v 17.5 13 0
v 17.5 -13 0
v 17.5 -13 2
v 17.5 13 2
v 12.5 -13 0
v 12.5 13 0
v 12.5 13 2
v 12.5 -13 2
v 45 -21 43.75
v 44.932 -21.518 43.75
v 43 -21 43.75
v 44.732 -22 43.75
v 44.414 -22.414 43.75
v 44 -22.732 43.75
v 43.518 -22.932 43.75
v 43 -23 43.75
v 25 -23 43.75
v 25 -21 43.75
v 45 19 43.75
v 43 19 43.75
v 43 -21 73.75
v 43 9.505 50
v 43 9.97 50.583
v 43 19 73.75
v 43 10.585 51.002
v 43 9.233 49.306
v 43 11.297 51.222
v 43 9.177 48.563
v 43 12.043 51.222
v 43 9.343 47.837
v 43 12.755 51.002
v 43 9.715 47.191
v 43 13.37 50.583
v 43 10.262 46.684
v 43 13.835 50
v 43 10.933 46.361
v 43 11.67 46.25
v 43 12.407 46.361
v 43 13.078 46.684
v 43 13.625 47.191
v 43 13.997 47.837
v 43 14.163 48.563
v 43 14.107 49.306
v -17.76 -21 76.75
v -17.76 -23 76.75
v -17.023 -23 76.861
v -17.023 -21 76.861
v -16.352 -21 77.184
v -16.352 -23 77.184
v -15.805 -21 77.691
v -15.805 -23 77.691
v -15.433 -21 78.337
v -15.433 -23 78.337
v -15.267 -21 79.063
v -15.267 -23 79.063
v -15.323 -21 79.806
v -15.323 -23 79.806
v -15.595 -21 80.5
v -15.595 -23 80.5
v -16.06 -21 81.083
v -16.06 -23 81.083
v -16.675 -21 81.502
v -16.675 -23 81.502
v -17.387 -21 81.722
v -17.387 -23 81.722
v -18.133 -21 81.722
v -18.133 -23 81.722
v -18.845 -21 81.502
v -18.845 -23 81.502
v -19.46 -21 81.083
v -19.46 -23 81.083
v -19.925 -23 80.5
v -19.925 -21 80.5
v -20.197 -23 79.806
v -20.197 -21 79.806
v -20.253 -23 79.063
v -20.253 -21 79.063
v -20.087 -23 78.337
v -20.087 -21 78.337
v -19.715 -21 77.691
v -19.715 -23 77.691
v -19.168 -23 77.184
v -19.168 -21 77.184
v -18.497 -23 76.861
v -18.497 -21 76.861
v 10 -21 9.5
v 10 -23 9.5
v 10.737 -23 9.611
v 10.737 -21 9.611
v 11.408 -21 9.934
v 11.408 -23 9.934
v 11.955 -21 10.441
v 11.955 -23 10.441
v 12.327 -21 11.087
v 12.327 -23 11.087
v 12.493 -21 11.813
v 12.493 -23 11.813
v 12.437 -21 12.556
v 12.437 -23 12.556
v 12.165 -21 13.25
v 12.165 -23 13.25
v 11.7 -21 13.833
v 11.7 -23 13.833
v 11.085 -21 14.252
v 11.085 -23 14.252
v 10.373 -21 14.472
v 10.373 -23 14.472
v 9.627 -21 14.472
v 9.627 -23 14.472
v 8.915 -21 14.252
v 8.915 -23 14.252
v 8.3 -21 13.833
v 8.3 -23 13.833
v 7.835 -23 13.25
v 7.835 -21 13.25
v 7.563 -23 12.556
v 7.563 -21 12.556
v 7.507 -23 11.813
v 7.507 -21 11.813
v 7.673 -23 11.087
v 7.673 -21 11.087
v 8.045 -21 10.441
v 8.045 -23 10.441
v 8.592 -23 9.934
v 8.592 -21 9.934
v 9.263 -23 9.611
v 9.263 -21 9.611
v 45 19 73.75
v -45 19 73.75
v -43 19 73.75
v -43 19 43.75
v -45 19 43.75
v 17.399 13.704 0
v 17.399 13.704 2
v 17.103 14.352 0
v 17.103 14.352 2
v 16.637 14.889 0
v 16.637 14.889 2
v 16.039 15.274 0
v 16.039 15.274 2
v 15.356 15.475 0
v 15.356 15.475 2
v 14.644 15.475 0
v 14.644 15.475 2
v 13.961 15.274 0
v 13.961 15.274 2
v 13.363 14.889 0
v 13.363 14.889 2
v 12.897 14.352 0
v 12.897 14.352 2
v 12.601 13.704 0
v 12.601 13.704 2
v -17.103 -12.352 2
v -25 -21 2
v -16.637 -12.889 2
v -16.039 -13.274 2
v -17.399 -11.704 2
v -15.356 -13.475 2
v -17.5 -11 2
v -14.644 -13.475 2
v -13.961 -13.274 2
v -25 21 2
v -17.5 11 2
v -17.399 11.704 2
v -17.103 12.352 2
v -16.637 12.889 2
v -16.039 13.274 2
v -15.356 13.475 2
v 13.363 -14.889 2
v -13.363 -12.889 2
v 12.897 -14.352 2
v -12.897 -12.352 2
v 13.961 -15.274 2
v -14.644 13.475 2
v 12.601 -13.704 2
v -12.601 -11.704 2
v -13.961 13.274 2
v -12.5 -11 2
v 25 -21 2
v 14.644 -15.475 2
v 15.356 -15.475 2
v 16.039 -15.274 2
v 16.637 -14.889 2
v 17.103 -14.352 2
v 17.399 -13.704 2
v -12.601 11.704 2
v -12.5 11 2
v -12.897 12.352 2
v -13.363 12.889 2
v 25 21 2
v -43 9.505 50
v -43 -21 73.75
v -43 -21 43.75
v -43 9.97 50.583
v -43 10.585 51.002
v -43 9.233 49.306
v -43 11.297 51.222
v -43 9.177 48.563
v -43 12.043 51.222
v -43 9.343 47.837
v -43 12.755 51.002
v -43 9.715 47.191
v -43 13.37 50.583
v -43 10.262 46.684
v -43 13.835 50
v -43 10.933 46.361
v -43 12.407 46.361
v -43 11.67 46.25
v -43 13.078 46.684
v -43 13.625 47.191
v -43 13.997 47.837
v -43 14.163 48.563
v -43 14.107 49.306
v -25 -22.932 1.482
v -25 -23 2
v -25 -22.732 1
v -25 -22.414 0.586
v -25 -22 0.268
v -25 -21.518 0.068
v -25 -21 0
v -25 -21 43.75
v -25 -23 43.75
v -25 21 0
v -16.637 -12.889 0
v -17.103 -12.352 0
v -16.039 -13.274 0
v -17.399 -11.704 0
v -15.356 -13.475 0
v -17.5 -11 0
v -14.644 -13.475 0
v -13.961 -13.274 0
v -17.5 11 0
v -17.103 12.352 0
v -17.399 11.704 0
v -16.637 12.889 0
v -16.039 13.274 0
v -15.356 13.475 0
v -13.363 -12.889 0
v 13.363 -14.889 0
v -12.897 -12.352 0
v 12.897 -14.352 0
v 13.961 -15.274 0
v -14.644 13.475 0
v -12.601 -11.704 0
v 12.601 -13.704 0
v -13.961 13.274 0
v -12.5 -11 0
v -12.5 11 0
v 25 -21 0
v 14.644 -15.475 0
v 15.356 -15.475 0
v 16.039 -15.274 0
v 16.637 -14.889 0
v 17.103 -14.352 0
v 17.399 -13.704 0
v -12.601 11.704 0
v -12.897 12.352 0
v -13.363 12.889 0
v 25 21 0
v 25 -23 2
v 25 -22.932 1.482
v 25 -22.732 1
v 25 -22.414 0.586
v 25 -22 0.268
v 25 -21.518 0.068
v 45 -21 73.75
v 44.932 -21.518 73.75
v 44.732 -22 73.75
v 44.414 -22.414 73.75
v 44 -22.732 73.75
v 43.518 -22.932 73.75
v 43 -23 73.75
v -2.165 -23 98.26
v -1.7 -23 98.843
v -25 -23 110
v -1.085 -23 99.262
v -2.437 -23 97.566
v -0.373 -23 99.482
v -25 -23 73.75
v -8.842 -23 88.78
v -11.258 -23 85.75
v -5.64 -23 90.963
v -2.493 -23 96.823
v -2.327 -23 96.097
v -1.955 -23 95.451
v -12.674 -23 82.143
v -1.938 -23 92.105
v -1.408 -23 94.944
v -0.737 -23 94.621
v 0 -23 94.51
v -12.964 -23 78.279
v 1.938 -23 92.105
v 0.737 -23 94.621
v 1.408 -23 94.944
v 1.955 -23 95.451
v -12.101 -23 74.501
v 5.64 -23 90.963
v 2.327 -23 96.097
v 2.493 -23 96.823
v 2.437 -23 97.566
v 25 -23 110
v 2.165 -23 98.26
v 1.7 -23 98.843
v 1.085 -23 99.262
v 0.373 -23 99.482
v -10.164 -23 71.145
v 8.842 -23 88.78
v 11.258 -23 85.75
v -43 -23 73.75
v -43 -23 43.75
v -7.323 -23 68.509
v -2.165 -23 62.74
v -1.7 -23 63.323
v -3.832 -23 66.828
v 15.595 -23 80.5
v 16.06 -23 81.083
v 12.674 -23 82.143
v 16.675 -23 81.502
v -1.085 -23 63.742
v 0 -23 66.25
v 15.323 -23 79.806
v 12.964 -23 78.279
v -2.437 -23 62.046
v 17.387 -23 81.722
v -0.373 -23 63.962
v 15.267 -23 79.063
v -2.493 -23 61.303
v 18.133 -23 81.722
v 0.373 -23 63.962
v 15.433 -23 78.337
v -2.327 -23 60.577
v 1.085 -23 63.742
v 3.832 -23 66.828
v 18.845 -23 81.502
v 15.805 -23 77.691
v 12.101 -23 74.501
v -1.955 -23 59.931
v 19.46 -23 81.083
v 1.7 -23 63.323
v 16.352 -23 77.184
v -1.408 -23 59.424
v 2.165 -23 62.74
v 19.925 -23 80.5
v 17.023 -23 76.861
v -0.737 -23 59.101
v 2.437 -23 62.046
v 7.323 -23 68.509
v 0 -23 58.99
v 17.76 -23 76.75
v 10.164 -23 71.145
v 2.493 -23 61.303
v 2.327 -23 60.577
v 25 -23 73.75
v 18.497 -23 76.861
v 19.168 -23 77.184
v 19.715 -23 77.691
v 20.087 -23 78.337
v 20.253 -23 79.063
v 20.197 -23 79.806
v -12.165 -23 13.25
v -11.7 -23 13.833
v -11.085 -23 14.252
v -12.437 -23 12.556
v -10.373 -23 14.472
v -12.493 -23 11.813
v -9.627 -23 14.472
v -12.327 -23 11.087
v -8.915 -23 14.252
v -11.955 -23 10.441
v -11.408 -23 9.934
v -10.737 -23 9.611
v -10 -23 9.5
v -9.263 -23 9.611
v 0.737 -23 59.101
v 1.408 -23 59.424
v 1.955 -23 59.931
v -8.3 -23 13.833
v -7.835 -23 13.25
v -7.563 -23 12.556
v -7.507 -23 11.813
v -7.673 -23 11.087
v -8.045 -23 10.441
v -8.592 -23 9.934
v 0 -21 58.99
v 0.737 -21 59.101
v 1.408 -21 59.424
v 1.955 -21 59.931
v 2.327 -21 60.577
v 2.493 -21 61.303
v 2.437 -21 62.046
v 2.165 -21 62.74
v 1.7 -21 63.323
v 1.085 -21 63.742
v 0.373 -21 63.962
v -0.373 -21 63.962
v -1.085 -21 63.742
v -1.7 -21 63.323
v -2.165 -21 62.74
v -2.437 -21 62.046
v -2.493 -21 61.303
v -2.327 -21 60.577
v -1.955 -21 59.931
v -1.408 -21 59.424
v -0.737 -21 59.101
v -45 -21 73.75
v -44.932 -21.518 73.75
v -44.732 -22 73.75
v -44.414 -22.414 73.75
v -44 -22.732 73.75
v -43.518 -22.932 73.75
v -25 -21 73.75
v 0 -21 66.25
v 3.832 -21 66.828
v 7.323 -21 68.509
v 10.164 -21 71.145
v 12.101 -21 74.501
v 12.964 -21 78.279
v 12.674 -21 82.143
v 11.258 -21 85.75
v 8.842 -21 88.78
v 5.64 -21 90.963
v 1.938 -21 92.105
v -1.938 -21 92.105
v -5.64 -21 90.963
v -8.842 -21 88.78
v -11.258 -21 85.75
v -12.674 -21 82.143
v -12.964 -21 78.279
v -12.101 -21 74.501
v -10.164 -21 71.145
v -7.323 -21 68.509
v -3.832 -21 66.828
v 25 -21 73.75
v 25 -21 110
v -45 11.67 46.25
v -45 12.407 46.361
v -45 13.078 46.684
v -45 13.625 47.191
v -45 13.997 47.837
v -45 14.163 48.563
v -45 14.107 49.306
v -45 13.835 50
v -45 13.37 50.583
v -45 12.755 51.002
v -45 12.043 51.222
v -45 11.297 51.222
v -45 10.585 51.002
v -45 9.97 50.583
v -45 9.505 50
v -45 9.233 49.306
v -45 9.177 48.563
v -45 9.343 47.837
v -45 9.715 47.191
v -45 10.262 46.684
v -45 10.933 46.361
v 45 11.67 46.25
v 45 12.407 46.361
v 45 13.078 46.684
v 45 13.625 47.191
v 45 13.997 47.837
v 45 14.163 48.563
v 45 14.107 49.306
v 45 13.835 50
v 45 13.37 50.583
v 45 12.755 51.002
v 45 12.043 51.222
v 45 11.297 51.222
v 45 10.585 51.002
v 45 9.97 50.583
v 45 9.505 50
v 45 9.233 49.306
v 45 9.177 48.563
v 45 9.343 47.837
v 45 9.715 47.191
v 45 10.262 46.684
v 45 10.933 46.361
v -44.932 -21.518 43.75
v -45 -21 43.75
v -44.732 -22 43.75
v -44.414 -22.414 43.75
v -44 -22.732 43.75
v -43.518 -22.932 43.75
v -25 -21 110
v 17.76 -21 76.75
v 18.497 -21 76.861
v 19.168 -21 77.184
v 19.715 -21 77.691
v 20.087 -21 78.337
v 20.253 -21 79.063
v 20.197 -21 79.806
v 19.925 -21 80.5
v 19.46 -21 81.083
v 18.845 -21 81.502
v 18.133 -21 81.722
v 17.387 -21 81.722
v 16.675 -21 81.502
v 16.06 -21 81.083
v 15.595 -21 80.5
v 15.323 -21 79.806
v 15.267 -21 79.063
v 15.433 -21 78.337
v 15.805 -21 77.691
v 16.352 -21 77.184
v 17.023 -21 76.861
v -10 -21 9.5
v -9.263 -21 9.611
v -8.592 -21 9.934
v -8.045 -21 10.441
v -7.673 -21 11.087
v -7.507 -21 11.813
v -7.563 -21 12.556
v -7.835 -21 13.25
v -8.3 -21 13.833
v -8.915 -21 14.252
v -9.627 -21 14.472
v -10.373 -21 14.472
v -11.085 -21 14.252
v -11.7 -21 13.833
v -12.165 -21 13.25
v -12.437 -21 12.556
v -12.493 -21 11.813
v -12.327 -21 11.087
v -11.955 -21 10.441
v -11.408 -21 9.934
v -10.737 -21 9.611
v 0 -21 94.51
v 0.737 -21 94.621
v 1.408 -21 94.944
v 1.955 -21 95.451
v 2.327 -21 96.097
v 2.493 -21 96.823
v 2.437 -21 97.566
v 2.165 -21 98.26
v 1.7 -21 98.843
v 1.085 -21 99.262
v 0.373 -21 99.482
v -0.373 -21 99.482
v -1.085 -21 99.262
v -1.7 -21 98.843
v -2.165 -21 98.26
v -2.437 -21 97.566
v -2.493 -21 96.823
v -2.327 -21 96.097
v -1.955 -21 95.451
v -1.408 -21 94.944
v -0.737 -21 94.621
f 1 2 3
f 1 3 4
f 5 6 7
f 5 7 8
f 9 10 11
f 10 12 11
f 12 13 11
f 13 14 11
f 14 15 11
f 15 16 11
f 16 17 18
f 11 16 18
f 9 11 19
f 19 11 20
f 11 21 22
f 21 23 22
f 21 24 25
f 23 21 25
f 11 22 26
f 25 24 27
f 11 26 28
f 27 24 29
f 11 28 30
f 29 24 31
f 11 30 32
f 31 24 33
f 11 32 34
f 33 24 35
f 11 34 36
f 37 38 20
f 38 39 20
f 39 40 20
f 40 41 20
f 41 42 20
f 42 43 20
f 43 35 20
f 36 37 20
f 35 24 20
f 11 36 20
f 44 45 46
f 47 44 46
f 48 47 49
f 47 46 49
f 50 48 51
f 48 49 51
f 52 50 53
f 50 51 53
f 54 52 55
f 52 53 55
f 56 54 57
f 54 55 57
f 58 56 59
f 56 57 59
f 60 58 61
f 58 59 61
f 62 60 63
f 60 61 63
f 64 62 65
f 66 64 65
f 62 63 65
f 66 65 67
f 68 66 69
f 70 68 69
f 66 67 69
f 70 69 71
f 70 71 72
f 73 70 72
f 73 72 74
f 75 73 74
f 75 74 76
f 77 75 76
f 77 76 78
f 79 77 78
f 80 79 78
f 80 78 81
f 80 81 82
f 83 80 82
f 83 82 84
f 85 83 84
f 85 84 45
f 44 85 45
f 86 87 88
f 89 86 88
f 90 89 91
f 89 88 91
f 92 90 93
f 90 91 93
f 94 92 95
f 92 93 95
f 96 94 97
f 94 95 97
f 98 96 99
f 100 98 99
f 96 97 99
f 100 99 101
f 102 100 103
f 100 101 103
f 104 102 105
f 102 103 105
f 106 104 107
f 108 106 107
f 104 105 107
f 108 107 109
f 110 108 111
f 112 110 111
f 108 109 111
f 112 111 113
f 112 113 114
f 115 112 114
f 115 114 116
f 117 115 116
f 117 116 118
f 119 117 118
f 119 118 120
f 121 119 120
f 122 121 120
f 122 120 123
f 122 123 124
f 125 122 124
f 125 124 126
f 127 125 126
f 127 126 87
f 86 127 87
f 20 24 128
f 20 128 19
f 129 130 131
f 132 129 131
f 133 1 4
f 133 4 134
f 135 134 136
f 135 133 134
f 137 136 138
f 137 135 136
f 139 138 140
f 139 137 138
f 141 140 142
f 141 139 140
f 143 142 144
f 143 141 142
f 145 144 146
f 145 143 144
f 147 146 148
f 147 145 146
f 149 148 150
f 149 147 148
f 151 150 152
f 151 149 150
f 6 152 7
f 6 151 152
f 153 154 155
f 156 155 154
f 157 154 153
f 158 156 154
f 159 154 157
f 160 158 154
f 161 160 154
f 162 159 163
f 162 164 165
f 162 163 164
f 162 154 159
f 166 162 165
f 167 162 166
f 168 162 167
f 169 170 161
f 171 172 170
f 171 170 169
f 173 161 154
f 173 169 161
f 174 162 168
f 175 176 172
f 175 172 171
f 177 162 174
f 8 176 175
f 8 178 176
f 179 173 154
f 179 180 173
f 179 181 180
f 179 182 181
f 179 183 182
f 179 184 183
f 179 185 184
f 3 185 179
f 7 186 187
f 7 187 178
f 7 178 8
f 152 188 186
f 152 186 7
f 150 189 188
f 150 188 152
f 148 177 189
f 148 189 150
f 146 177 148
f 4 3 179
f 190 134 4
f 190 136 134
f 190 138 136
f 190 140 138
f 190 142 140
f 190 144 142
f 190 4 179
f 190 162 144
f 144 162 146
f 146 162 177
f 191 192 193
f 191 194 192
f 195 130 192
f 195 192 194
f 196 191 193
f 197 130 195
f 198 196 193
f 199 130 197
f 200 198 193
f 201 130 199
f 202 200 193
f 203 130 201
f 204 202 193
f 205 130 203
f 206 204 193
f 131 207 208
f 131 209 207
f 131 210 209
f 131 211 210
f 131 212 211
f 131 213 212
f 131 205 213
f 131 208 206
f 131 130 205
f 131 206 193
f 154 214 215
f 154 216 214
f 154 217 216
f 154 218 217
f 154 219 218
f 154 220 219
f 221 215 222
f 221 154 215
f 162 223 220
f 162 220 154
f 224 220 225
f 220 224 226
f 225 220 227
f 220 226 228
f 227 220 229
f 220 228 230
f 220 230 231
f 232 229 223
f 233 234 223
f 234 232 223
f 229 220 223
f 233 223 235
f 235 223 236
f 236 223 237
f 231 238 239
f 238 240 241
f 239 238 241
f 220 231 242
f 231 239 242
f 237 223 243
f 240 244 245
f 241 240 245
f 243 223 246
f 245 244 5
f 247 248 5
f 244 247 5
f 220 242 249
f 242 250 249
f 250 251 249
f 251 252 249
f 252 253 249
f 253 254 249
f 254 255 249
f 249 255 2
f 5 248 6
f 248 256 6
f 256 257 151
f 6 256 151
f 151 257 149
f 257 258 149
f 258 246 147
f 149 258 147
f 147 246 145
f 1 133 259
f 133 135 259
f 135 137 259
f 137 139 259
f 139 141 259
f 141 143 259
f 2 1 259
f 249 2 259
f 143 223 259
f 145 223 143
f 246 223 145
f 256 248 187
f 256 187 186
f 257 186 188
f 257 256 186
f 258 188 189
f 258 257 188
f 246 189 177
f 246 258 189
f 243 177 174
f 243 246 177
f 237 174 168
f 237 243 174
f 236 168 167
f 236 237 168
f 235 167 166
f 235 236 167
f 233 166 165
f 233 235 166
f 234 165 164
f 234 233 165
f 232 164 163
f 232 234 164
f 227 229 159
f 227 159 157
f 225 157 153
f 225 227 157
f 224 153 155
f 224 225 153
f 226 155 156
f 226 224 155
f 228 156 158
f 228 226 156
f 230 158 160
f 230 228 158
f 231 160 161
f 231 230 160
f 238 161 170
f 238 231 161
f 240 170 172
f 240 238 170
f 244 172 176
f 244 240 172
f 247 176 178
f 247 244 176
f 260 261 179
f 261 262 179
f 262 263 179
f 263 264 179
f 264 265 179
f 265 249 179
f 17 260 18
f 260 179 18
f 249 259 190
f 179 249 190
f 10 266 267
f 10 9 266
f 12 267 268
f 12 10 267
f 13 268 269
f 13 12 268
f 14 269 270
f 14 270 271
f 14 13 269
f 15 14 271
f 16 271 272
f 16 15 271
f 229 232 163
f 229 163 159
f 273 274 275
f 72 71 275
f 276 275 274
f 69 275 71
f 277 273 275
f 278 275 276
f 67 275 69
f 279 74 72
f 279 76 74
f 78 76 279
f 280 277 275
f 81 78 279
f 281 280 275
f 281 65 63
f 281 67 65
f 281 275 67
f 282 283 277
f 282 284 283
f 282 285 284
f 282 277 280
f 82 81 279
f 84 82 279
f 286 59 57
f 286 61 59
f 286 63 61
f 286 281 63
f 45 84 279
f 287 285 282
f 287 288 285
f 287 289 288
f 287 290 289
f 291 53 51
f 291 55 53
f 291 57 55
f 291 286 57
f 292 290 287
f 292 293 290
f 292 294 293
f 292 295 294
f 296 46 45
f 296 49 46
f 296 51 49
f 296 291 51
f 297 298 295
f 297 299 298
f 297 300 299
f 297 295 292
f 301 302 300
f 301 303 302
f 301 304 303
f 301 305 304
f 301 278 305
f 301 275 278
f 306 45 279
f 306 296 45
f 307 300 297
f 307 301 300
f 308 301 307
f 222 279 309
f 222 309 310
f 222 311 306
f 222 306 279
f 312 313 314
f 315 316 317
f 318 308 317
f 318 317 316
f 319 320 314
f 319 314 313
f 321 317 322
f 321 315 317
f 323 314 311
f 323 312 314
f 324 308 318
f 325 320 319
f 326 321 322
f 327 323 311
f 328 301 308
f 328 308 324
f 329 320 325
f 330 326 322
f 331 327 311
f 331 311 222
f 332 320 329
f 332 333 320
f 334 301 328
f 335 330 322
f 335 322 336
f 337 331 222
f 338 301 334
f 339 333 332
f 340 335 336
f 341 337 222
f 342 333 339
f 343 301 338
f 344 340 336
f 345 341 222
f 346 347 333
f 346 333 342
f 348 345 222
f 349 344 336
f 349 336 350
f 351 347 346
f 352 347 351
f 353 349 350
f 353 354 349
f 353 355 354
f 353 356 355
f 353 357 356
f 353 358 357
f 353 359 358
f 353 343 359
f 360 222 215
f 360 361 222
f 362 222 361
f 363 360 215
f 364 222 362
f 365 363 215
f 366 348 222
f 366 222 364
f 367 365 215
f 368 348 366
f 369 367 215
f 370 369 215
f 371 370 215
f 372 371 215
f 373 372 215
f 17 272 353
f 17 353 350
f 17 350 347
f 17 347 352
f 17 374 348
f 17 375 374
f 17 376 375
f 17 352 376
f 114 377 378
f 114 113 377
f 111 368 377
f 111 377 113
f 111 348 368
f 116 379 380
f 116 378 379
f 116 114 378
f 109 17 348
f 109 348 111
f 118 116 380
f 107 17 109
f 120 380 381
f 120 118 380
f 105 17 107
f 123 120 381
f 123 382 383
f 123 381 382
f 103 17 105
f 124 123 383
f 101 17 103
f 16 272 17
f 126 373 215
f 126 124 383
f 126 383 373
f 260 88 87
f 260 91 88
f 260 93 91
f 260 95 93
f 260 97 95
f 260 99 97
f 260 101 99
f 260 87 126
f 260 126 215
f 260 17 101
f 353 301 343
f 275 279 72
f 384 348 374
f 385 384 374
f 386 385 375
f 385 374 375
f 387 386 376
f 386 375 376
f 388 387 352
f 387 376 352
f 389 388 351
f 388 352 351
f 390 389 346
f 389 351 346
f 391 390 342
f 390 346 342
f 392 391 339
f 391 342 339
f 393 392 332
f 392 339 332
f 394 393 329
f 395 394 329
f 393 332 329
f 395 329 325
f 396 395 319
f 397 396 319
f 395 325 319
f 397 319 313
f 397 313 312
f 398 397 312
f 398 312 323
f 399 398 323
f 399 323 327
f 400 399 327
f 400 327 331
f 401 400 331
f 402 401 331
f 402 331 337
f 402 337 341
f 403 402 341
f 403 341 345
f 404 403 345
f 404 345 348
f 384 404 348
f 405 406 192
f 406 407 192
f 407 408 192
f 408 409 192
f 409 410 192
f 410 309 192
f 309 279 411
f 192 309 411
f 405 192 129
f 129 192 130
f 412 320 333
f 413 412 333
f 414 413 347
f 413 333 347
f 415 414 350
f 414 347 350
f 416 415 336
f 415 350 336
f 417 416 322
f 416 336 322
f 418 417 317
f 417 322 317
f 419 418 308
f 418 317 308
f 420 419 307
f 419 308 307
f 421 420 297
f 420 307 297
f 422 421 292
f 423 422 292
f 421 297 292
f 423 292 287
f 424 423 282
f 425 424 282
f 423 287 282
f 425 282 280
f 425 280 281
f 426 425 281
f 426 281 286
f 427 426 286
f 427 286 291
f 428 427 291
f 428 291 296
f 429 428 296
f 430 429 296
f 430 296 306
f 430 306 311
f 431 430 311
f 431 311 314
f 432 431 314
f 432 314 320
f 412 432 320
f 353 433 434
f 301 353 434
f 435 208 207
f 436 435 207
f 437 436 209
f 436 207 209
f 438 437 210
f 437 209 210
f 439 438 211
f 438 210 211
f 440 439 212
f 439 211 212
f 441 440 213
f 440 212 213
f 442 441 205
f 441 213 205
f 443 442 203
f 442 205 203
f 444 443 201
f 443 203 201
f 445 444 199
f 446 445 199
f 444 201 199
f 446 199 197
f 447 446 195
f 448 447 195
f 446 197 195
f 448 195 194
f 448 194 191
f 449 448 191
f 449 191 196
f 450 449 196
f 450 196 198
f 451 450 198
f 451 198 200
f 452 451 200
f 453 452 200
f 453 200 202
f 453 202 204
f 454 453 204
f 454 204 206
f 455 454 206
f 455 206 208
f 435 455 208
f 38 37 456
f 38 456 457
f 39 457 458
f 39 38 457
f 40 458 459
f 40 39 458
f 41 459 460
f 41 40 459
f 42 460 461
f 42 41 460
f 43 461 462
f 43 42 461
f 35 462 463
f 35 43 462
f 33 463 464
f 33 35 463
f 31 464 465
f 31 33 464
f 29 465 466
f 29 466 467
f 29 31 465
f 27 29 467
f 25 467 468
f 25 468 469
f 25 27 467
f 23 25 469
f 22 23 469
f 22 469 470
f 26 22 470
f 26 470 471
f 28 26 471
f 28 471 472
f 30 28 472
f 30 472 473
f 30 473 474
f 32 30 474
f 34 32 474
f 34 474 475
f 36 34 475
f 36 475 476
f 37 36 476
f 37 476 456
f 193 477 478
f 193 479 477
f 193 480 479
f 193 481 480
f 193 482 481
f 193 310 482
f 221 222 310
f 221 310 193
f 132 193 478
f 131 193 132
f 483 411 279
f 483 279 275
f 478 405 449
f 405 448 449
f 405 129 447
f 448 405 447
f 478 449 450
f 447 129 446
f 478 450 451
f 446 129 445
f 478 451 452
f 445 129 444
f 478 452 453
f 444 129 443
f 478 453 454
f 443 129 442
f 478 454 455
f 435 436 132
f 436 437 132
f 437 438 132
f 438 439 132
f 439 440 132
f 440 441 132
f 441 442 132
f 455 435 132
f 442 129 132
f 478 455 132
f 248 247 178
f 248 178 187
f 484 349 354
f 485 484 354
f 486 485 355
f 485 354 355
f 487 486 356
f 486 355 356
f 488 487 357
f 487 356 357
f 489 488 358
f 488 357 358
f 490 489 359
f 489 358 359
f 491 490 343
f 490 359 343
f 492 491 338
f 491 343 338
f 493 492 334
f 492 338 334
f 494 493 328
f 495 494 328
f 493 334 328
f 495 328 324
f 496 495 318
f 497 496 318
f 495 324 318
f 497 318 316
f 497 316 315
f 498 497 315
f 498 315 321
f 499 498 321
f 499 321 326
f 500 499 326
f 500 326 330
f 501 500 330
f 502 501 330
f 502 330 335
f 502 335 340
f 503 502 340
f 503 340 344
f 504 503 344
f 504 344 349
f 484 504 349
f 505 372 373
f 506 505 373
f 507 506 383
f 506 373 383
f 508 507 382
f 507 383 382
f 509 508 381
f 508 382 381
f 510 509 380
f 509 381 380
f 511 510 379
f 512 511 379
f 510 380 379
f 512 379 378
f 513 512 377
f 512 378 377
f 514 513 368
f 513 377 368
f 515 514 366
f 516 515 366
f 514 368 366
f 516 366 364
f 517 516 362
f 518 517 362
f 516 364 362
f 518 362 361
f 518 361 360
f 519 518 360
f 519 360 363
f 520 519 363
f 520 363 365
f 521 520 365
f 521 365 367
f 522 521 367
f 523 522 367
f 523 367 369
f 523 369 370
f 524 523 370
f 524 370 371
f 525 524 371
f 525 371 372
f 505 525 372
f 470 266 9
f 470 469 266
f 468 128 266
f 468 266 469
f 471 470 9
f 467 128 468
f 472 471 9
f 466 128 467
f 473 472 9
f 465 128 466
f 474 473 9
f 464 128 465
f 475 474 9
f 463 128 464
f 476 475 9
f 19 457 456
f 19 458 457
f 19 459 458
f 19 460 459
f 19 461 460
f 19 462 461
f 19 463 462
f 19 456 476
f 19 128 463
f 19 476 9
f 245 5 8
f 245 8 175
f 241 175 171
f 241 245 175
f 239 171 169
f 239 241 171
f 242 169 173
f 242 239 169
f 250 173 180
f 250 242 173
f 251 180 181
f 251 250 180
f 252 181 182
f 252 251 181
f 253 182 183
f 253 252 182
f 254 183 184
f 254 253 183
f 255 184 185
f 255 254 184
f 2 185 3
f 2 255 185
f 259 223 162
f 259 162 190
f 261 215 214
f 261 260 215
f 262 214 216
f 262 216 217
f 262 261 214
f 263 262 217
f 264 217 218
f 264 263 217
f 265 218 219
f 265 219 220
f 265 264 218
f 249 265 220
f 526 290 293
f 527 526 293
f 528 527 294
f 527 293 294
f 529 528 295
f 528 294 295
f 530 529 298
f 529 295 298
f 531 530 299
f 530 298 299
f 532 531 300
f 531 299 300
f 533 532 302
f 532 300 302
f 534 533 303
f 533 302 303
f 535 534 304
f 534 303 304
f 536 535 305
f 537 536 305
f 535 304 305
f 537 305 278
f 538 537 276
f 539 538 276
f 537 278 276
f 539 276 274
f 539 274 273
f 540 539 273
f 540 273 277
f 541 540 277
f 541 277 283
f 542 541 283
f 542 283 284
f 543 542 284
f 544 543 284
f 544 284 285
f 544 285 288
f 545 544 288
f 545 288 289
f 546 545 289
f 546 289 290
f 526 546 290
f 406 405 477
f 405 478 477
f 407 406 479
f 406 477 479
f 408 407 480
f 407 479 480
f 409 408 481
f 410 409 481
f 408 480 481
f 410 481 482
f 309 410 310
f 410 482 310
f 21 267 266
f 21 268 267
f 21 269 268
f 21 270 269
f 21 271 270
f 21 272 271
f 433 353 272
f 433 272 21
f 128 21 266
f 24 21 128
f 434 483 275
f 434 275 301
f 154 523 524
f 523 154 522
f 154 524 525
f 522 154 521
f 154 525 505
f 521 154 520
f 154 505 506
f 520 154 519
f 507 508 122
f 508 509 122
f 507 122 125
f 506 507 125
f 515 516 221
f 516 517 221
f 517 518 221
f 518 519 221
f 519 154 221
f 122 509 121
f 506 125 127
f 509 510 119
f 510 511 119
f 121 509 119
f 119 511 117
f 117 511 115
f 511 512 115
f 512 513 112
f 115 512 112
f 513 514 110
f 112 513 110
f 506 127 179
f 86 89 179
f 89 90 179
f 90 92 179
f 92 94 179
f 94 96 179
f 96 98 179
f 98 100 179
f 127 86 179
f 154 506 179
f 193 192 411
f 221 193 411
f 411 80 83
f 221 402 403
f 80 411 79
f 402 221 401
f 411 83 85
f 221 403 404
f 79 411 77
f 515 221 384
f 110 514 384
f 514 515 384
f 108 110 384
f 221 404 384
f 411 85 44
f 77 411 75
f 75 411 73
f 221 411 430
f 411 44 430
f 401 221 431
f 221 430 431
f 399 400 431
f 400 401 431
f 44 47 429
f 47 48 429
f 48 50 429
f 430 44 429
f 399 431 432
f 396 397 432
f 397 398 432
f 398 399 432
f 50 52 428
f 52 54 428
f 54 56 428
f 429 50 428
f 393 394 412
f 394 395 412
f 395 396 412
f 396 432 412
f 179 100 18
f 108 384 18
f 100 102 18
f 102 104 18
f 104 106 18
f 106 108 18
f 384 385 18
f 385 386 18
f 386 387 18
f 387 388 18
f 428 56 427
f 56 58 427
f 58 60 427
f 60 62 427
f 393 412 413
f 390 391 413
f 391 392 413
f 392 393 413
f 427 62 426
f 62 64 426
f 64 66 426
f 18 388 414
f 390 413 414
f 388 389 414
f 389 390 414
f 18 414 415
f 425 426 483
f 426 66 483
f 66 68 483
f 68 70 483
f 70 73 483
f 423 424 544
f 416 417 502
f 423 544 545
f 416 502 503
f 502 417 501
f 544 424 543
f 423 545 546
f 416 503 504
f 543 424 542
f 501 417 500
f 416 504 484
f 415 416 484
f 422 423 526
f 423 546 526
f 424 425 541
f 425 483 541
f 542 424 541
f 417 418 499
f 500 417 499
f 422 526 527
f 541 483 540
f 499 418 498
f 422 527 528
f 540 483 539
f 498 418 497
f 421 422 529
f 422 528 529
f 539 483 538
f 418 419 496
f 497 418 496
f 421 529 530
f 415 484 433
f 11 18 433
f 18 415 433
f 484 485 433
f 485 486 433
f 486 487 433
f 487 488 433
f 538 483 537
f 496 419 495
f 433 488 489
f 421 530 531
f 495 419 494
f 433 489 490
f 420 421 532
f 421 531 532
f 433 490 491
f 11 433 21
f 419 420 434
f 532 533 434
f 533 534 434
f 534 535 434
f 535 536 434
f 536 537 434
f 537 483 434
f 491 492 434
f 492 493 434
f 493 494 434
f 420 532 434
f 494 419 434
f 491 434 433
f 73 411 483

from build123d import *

# Parameters (mm, degrees)
SKETCH_1_W          = 50
SKETCH_1_H          = 42
EXTRUDE_1_DEPTH     = 2
SKETCH_2_W          = 50
SKETCH_2_H          = 110
EXTRUDE_2_DEPTH     = 2
CUT_EXTRUDE_1_REACH = 123.083
SKETCH_3_R          = 2.5
CUT_EXTRUDE_2_REACH = 123.083
SKETCH_4_R          = 13
FILLET_1_R          = 2
SKETCH_5_W          = 30
SKETCH_5_H          = 2
EXTRUDE_3_DEPTH     = 18
SKETCH_6_W          = 30
SKETCH_6_H          = 42
EXTRUDE_4_DEPTH     = 2
FILLET_2_R          = 2
CUT_EXTRUDE_3_REACH = 144.734
SKETCH_7_R          = 2.5
CUT_EXTRUDE_4_REACH = 128.732
SKETCH_8_R          = 2.5


with BuildPart() as part:
    # 草图1 → 凸台-拉伸1 (new body)
    with BuildSketch(Plane.XY):
        Rectangle(SKETCH_1_W, SKETCH_1_H)
        with BuildLine():
            Line((-17.5, 11), (-17.5, -11))
            ThreePointArc((-17.5, -11), (-15, -13.5), (-12.5, -11))
            Line((-12.5, -11), (-12.5, 11))
            ThreePointArc((-12.5, 11), (-15, 13.5), (-17.5, 11))
        make_face(mode=Mode.SUBTRACT)
        with BuildLine():
            Line((12.5, 13), (12.5, -13))
            ThreePointArc((12.5, -13), (15, -15.5), (17.5, -13))
            Line((17.5, -13), (17.5, 13))
            ThreePointArc((17.5, 13), (15, 15.5), (12.5, 13))
        make_face(mode=Mode.SUBTRACT)
    extrude(amount=EXTRUDE_1_DEPTH)

    # 草图2 → 凸台-拉伸2 (add)
    with BuildSketch(Plane.XZ.offset(21)):
        with Locations((0, 55)):
            Rectangle(SKETCH_2_W, SKETCH_2_H)
    extrude(amount=EXTRUDE_2_DEPTH)

    # 草图3 → 切除-拉伸1 (cut, up to next)
    with BuildSketch(Plane.XZ.offset(23), mode=Mode.PRIVATE) as cut_extrude_1_sk1:
        with Locations((17.76, 79.25)):
            Circle(SKETCH_3_R)
    cut_extrude_1_tool1 = extrude(cut_extrude_1_sk1.sketch, amount=-CUT_EXTRUDE_1_REACH, mode=Mode.PRIVATE) & part.part
    # 草图3 → 切除-拉伸1 (cut, up to next)
    with BuildSketch(Plane.XZ.offset(23), mode=Mode.PRIVATE) as cut_extrude_1_sk2:
        with Locations((-17.76, 79.25)):
            Circle(SKETCH_3_R)
    cut_extrude_1_tool2 = extrude(cut_extrude_1_sk2.sketch, amount=-CUT_EXTRUDE_1_REACH, mode=Mode.PRIVATE) & part.part
    # 草图3 → 切除-拉伸1 (cut, up to next)
    with BuildSketch(Plane.XZ.offset(23), mode=Mode.PRIVATE) as cut_extrude_1_sk3:
        with Locations((0, 61.49)):
            Circle(SKETCH_3_R)
    cut_extrude_1_tool3 = extrude(cut_extrude_1_sk3.sketch, amount=-CUT_EXTRUDE_1_REACH, mode=Mode.PRIVATE) & part.part
    # 草图3 → 切除-拉伸1 (cut, up to next)
    with BuildSketch(Plane.XZ.offset(23), mode=Mode.PRIVATE) as cut_extrude_1_sk4:
        with Locations((0, 97.01)):
            Circle(SKETCH_3_R)
    cut_extrude_1_tool4 = extrude(cut_extrude_1_sk4.sketch, amount=-CUT_EXTRUDE_1_REACH, mode=Mode.PRIVATE) & part.part
    add(cut_extrude_1_tool1.solids().sort_by_distance((17.76, -23, 79.25))[0], mode=Mode.SUBTRACT)
    add(cut_extrude_1_tool2.solids().sort_by_distance((-17.76, -23, 79.25))[0], mode=Mode.SUBTRACT)
    add(cut_extrude_1_tool3.solids().sort_by_distance((0, -23, 61.49))[0], mode=Mode.SUBTRACT)
    add(cut_extrude_1_tool4.solids().sort_by_distance((0, -23, 97.01))[0], mode=Mode.SUBTRACT)

    # 草图4 → 切除-拉伸2 (cut, up to next)
    with BuildSketch(Plane.XZ.offset(23), mode=Mode.PRIVATE) as cut_extrude_2_sk1:
        with Locations((0, 79.25)):
            Circle(SKETCH_4_R)
    cut_extrude_2_tool1 = extrude(cut_extrude_2_sk1.sketch, amount=-CUT_EXTRUDE_2_REACH, mode=Mode.PRIVATE) & part.part
    add(cut_extrude_2_tool1.solids().sort_by_distance((0, -23, 79.25))[0], mode=Mode.SUBTRACT)

    # 圆角1
    fillet_1_edges = [part.edges().sort_by_distance(p)[0] for p in [
        (0, -23, 0),
    ]]
    fillet(fillet_1_edges, radius=FILLET_1_R)

    # 草图5 → 凸台-拉伸3 (add)
    with BuildSketch(Plane(origin=(25, 0, 0), x_dir=(0, 0, -1), z_dir=(1, 0, 0))):
        with Locations((-58.75, -22)):
            Rectangle(SKETCH_5_W, SKETCH_5_H)
    extrude_3 = extrude(amount=EXTRUDE_3_DEPTH)

    # 草图6 → 凸台-拉伸4 (add)
    with BuildSketch(Plane(origin=(43, 0, 0), x_dir=(0, 0, -1), z_dir=(1, 0, 0))):
        with Locations((-58.75, -2)):
            Rectangle(SKETCH_6_W, SKETCH_6_H)
    extrude_4 = extrude(amount=EXTRUDE_4_DEPTH)

    # 镜向1: 凸台-拉伸3, 凸台-拉伸4 across plane
    add(extrude_3.mirror(Plane(origin=(0, 0, 0), x_dir=(0, 0, 1), z_dir=(1, 0, 0))))
    add(extrude_4.mirror(Plane(origin=(0, 0, 0), x_dir=(0, 0, 1), z_dir=(1, 0, 0))))

    # 圆角2
    fillet_2_edges = [part.edges().sort_by_distance(p)[0] for p in [
        (-45, -23, 58.75),
        (45, -23, 58.75),
    ]]
    fillet(fillet_2_edges, radius=FILLET_2_R)

    # 草图7 → 切除-拉伸3 (cut, up to next)
    with BuildSketch(Plane(origin=(-43, 0, 0), x_dir=(0, 0, -1), z_dir=(1, 0, 0)), mode=Mode.PRIVATE) as cut_extrude_3_sk1:
        with Locations((-48.75, 11.67)):
            Circle(SKETCH_7_R)
    cut_extrude_3_tool1 = extrude(cut_extrude_3_sk1.sketch, amount=-CUT_EXTRUDE_3_REACH, mode=Mode.PRIVATE) & part.part
    cut_extrude_3 = cut_extrude_3_tool1.solids().sort_by_distance((-43, 11.67, 48.75))[0]
    add(cut_extrude_3, mode=Mode.SUBTRACT)

    # 镜向2: 切除-拉伸3 across plane
    add(cut_extrude_3.mirror(Plane(origin=(0, 0, 0), x_dir=(0, 0, 1), z_dir=(1, 0, 0))), mode=Mode.SUBTRACT)

    # 草图8 → 切除-拉伸4 (cut, up to next)
    with BuildSketch(Plane.XZ.offset(23), mode=Mode.PRIVATE) as cut_extrude_4_sk1:
        with Locations((10, 12)):
            Circle(SKETCH_8_R)
    cut_extrude_4_tool1 = extrude(cut_extrude_4_sk1.sketch, amount=-CUT_EXTRUDE_4_REACH, mode=Mode.PRIVATE) & part.part
    # 草图8 → 切除-拉伸4 (cut, up to next)
    with BuildSketch(Plane.XZ.offset(23), mode=Mode.PRIVATE) as cut_extrude_4_sk2:
        with Locations((-10, 12)):
            Circle(SKETCH_8_R)
    cut_extrude_4_tool2 = extrude(cut_extrude_4_sk2.sketch, amount=-CUT_EXTRUDE_4_REACH, mode=Mode.PRIVATE) & part.part
    add(cut_extrude_4_tool1.solids().sort_by_distance((10, -23, 12))[0], mode=Mode.SUBTRACT)
    add(cut_extrude_4_tool2.solids().sort_by_distance((-10, -23, 12))[0], mode=Mode.SUBTRACT)


solid = part.part
